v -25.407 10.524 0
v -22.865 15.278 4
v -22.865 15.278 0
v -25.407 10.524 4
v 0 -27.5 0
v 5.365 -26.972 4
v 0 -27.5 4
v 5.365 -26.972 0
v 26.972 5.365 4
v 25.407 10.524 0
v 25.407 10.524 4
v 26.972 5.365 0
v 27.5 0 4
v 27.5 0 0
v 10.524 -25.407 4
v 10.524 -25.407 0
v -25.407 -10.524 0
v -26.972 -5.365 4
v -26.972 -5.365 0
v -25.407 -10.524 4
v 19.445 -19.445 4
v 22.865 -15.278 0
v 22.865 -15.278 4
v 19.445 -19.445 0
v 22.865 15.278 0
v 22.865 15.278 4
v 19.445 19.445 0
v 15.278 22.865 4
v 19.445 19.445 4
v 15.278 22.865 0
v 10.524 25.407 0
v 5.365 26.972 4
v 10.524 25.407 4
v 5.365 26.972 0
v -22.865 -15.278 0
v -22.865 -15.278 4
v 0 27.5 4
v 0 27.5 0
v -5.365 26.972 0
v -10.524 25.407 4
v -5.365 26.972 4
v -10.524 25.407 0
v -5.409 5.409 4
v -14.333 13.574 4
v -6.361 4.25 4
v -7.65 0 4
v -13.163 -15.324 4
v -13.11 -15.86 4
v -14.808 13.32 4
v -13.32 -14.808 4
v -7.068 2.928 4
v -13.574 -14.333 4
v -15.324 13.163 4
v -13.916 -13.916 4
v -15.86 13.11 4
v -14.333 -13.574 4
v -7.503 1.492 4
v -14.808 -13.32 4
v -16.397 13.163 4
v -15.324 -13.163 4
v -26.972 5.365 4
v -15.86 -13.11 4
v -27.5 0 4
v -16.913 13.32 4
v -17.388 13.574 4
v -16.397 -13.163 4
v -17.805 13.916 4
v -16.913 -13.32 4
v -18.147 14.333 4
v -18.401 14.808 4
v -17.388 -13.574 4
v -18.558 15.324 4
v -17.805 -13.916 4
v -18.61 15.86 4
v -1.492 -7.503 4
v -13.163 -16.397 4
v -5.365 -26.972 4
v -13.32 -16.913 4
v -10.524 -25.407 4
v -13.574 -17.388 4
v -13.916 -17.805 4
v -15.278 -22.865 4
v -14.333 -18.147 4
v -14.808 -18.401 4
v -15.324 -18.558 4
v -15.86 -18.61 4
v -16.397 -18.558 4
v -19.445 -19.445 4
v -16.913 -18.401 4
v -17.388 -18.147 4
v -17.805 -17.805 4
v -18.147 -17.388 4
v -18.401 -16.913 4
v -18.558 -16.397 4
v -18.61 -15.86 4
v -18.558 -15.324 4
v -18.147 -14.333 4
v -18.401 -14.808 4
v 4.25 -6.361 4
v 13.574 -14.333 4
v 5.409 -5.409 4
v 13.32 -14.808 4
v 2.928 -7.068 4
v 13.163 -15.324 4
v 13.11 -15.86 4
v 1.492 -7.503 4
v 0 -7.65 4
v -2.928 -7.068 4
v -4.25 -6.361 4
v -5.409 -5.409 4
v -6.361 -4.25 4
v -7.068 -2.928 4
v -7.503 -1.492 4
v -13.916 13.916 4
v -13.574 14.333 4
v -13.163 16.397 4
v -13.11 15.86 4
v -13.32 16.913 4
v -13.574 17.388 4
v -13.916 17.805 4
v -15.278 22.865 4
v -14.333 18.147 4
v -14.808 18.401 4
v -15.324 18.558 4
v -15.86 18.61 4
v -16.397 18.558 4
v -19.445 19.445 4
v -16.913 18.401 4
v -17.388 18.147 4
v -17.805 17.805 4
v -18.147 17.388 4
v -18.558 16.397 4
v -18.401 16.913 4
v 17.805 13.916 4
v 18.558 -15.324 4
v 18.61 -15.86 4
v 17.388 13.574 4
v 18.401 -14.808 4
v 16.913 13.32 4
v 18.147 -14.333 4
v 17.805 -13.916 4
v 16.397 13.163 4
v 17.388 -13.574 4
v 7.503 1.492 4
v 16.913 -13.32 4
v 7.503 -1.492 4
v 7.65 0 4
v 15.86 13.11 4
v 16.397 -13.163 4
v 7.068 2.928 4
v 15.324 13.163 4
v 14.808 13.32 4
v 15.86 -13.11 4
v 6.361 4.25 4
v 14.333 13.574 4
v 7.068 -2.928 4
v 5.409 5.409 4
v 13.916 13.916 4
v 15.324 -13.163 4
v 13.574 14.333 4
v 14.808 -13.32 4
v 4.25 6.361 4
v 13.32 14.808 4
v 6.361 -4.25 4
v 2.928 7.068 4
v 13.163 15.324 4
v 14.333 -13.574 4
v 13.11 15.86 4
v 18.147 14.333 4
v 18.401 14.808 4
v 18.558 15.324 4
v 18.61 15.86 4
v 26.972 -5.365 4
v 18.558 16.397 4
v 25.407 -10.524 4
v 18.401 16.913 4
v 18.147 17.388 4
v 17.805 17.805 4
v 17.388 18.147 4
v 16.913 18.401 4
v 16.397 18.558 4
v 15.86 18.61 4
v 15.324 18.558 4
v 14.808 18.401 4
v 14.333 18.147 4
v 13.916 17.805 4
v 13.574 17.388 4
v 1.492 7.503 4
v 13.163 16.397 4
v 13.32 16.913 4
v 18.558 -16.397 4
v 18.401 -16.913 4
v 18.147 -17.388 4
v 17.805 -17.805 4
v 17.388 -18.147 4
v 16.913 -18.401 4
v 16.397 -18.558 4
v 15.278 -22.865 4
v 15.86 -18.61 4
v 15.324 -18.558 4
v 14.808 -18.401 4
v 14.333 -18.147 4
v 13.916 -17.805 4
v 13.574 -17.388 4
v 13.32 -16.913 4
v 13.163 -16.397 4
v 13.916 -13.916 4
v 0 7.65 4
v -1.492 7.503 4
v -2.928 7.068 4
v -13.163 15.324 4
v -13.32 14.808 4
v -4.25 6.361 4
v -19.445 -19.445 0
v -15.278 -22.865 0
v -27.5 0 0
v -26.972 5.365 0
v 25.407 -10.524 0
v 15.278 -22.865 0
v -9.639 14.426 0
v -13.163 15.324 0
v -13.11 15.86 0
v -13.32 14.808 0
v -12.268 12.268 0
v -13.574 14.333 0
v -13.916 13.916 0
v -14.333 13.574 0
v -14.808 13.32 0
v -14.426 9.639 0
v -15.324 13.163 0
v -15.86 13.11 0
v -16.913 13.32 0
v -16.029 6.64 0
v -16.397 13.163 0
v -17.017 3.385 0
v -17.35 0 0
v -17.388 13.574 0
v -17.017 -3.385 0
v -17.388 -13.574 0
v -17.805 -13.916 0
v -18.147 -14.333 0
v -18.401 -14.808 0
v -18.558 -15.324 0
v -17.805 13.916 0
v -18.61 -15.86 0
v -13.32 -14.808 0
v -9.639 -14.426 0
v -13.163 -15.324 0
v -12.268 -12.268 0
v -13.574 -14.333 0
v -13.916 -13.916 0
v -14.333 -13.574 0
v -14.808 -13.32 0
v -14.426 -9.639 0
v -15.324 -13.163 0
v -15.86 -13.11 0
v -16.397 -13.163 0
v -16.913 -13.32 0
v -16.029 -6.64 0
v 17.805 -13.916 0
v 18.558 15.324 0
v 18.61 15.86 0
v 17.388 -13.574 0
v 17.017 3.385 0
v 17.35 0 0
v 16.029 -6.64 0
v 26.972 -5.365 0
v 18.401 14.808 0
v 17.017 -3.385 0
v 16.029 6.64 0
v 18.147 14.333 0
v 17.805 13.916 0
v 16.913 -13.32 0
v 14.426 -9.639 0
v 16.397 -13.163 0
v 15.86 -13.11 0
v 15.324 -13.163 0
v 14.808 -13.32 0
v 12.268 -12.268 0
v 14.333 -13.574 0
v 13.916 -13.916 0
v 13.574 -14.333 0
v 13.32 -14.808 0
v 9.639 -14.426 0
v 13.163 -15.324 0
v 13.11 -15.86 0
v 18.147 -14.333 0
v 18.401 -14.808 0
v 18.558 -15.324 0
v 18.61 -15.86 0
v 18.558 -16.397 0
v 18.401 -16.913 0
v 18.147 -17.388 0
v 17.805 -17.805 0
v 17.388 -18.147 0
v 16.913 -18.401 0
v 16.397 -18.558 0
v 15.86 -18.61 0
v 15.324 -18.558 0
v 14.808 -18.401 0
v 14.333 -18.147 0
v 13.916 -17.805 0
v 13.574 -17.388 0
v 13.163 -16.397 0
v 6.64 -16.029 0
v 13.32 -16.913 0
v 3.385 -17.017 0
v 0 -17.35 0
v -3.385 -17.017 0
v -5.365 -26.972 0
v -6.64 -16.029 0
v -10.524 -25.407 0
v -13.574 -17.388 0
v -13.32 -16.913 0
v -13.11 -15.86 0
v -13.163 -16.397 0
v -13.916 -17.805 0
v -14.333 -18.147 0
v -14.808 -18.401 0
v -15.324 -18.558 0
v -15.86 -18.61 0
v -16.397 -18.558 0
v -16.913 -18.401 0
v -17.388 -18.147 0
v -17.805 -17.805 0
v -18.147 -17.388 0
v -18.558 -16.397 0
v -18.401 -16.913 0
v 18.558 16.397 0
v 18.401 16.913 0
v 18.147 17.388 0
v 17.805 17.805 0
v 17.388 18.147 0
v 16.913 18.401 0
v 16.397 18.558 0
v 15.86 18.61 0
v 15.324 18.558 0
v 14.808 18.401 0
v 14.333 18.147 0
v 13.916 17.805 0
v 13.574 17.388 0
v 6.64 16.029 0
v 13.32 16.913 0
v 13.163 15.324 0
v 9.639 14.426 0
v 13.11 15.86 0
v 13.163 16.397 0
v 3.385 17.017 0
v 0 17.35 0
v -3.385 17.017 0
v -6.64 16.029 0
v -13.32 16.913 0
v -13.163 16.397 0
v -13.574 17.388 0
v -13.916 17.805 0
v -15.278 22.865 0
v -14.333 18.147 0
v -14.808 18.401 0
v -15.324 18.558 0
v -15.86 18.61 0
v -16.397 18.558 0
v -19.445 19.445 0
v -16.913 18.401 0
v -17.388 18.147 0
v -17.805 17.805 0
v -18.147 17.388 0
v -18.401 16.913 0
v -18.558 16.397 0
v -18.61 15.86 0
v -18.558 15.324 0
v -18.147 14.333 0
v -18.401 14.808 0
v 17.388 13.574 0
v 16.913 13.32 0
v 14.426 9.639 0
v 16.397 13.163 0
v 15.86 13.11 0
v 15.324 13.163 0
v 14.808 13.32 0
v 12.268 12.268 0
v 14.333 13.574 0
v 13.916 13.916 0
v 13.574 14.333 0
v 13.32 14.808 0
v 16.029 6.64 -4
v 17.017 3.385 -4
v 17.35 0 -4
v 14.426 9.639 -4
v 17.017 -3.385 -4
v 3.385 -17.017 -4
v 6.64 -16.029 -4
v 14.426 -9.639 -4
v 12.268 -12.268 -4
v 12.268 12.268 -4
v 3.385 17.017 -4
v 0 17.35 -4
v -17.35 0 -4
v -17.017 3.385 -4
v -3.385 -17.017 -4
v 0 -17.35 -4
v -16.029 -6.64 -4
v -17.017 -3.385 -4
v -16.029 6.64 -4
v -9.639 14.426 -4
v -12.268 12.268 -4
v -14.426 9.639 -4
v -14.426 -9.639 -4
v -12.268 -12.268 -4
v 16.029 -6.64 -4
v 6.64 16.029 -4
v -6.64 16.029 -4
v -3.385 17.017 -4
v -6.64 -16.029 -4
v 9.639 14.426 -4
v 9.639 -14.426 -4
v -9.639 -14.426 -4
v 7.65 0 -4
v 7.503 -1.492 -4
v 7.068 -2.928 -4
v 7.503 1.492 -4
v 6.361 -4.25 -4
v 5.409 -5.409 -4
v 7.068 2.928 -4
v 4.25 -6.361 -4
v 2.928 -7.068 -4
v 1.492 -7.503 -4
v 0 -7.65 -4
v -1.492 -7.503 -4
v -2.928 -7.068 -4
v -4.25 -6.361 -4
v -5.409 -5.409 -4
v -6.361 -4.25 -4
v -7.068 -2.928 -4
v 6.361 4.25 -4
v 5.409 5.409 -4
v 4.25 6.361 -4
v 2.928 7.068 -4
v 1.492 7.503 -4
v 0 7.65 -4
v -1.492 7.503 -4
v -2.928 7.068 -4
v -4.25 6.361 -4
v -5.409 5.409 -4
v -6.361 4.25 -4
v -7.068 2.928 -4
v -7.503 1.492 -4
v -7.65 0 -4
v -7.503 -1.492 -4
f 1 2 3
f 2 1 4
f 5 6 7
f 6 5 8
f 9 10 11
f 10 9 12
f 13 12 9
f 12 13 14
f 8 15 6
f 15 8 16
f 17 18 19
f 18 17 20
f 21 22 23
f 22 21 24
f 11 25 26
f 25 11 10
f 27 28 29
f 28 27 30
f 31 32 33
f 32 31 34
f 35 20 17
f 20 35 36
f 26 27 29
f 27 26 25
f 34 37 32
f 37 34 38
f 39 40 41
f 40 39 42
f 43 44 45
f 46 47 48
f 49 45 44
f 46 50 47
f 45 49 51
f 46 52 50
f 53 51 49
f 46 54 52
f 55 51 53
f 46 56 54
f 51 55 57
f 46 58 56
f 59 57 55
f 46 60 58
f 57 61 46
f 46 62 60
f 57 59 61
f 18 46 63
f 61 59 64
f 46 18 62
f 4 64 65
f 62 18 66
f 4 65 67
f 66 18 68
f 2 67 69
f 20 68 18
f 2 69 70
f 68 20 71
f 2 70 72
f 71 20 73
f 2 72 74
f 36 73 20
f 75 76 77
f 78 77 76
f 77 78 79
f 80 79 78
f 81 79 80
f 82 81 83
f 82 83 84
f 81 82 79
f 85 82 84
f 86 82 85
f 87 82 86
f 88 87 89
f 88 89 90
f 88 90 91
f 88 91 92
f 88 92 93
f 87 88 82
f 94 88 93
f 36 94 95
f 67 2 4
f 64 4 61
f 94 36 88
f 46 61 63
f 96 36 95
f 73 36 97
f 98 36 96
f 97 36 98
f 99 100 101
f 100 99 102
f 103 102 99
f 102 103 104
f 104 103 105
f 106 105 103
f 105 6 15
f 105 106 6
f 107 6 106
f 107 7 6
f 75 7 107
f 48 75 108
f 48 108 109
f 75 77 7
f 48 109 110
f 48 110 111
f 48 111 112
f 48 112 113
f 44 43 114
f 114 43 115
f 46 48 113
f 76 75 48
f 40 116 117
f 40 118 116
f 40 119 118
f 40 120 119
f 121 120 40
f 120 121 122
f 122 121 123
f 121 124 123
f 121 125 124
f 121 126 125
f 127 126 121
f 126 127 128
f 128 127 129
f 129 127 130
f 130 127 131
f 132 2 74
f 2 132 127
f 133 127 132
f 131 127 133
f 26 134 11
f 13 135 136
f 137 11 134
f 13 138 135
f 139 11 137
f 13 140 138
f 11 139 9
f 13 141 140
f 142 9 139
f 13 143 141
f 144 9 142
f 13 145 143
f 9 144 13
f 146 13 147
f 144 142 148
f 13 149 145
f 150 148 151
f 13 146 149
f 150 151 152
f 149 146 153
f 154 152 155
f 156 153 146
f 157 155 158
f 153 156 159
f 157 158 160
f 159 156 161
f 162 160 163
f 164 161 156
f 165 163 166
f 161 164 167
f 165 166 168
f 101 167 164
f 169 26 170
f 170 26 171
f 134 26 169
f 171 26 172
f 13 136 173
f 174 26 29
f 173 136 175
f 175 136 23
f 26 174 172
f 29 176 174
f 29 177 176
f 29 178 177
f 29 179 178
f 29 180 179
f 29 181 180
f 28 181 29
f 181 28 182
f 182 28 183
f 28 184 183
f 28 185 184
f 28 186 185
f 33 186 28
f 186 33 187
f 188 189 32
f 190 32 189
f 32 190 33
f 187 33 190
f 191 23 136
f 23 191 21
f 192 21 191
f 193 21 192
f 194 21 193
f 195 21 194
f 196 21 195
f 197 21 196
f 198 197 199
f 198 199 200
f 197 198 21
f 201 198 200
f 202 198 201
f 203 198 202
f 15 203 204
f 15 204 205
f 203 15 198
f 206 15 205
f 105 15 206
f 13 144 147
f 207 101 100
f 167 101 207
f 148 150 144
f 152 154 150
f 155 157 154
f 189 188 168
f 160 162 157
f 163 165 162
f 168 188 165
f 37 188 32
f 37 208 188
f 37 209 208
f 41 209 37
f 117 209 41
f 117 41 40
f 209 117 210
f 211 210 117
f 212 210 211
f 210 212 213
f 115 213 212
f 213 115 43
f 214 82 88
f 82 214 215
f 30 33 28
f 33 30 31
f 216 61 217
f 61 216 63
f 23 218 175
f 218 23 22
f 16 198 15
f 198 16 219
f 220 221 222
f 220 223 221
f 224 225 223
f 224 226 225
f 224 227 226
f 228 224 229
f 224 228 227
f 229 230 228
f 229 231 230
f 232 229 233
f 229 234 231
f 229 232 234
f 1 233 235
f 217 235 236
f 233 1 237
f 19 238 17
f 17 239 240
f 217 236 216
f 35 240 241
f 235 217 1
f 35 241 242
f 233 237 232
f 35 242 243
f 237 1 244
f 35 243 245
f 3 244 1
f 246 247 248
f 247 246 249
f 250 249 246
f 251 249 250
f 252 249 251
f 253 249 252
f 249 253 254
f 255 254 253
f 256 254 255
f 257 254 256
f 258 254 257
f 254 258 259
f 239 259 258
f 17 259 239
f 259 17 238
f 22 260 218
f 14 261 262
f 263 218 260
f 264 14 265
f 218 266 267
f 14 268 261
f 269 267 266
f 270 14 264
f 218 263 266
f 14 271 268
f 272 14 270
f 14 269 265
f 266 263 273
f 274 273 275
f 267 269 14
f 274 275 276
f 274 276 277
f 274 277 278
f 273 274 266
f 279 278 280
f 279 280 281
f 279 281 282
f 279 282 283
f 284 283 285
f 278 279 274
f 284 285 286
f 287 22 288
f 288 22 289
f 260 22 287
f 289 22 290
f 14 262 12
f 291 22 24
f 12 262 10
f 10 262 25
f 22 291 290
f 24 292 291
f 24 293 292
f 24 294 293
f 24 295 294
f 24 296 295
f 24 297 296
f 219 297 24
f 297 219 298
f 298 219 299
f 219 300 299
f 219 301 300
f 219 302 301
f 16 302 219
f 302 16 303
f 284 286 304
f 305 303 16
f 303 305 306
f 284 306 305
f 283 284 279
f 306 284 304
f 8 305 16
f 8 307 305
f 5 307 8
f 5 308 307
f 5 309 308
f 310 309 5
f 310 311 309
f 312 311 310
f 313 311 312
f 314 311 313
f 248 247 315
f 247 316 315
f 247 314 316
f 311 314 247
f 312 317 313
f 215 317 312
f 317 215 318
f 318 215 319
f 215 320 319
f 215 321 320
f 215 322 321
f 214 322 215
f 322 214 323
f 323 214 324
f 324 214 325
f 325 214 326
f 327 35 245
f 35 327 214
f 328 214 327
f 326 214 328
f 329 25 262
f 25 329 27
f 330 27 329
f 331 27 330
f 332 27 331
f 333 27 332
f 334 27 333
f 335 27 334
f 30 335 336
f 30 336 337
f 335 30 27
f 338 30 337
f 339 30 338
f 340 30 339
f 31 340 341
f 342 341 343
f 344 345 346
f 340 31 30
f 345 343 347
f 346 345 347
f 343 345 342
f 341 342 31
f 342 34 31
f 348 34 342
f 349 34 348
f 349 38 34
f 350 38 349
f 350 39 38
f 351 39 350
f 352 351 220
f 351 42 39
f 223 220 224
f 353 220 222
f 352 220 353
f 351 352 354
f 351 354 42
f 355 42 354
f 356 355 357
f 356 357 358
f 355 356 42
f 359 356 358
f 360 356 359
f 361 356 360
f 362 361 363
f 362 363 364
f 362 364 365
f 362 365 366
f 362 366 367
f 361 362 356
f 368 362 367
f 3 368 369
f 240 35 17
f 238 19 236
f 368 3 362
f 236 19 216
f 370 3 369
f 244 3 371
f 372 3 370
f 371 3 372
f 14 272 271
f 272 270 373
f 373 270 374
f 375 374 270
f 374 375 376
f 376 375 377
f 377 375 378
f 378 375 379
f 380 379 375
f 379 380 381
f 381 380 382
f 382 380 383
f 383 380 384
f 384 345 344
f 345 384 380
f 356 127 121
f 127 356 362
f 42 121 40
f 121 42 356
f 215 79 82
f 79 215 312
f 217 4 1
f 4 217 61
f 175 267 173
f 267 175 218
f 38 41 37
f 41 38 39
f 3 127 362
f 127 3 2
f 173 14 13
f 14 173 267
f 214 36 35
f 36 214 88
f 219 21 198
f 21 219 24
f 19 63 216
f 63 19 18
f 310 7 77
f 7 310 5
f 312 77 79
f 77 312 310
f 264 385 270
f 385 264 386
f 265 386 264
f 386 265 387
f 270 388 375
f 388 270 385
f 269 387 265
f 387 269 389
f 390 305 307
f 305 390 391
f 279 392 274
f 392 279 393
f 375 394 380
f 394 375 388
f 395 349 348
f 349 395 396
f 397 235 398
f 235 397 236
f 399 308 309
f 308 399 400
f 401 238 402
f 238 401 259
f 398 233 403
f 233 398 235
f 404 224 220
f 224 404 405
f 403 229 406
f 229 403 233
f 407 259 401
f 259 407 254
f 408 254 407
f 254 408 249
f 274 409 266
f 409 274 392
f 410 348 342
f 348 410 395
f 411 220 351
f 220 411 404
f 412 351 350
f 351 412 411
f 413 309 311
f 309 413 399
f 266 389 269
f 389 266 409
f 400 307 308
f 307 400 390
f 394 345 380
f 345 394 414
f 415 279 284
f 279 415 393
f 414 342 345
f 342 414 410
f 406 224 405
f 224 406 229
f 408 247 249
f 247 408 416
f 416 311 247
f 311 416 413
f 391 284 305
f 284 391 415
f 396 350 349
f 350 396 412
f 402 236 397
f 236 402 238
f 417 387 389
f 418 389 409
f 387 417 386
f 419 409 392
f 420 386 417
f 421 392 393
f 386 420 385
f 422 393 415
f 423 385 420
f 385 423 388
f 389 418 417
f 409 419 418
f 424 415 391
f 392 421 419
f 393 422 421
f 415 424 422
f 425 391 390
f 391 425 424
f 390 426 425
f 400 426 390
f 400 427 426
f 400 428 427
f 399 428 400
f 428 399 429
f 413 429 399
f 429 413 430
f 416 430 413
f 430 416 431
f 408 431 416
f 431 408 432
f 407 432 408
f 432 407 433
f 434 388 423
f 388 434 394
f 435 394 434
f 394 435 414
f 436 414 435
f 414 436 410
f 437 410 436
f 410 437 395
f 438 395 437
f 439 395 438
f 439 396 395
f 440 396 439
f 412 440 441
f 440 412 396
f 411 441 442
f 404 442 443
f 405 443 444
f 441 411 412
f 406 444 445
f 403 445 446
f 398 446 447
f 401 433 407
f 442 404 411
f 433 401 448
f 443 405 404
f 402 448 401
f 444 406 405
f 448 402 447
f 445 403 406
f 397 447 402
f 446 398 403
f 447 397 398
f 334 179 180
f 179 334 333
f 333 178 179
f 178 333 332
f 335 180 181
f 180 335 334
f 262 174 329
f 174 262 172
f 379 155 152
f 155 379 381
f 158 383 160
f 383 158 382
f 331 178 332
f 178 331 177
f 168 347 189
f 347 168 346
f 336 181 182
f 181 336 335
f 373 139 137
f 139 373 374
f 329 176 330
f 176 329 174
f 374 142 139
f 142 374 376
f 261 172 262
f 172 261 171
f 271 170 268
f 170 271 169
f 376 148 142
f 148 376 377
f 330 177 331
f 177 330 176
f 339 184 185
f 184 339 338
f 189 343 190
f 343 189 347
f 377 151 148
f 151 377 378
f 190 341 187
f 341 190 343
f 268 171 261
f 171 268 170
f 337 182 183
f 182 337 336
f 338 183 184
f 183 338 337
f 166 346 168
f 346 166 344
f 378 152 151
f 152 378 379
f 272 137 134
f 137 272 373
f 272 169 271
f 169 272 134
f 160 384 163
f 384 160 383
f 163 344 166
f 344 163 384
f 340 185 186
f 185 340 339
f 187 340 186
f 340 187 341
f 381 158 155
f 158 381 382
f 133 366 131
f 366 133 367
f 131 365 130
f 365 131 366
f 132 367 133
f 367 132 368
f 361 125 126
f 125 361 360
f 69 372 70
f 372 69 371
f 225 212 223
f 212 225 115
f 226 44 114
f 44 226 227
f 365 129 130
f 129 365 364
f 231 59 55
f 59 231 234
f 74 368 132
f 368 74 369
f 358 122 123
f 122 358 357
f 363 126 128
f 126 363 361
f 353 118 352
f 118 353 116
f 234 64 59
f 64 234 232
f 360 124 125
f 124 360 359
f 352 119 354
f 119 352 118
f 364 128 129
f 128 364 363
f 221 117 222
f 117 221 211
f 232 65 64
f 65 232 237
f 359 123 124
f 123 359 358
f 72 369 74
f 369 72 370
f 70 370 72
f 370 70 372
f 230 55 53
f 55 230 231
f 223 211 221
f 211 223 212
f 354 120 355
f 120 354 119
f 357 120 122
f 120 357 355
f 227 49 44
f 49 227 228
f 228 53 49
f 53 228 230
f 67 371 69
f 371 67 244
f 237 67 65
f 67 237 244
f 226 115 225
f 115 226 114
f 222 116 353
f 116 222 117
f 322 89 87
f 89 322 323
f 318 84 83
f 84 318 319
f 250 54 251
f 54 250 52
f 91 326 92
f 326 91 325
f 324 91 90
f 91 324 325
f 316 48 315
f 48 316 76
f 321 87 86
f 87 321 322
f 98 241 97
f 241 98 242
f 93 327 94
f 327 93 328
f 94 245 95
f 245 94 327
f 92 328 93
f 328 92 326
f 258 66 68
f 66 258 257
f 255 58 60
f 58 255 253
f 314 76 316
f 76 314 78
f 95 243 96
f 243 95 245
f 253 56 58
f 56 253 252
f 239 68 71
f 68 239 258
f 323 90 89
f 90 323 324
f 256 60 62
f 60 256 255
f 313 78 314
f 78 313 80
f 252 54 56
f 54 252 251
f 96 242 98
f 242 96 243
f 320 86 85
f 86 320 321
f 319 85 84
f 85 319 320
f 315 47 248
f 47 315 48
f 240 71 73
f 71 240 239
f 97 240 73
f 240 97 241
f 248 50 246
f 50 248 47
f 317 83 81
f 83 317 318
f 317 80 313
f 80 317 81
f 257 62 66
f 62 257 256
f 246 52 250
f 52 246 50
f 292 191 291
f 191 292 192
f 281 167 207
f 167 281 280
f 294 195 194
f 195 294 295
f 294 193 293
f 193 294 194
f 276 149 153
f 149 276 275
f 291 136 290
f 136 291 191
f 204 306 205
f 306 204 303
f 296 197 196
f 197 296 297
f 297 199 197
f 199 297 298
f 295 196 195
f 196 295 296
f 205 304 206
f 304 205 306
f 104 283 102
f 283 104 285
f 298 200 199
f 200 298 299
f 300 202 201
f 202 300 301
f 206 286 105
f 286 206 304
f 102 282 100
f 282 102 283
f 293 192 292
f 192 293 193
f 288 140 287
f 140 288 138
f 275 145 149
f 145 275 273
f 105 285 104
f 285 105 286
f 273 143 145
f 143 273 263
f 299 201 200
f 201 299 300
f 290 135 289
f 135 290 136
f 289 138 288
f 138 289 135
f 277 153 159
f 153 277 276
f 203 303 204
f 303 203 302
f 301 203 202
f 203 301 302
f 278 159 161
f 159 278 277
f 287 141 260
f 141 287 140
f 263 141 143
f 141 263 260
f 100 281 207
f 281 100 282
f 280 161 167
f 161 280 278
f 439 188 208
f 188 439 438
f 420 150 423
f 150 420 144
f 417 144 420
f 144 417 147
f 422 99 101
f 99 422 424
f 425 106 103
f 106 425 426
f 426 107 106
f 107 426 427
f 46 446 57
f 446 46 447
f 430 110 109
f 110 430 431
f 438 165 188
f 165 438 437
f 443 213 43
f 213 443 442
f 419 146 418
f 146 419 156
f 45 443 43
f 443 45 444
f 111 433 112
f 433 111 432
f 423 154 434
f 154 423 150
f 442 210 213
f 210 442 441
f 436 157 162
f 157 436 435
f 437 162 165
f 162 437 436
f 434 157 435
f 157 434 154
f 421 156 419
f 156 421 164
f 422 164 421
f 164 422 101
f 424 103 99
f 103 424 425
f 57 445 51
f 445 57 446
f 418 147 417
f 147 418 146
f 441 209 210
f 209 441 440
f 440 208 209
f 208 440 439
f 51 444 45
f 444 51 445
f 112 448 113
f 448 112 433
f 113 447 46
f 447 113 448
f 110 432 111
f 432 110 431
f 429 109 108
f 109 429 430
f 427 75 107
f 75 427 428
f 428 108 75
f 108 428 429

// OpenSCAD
$fn = 32;

// ----------------------------------------------------------------------
// Retaining cap: 6202 cover, 55 mm, spigot 34.7 mm
// ----------------------------------------------------------------------

// --- parameters (mm) ---
cover_d = 55;             // cover diameter
cover_t = 4;              // cover thickness
spigot_d = 34.7;          // spigot that enters the housing
spigot_h = 4;             // spigot height
shaft_d = 15.3;           // shaft opening
bolt_d = 5.5;             // bolt clearance
bolt_r = 22.43;           // bolt circle radius

module cover() {
  cylinder(h = cover_t, d = cover_d);
}

module spigot() {
  /* sunk 1 mm into the cover; the spigot sets the overall height */
  translate([0, 0, -spigot_h]) cylinder(h = spigot_h + 1, d = spigot_d);
}

difference() {
  union() {
    cover();
    spigot();
  }
  for (i = [0 : 3]) rotate([0, 0, 45 + i * 90]) translate([bolt_r, 0, -spigot_h - 1])
    cylinder(h = spigot_h + cover_t + 2, d = bolt_d);
  translate([0, 0, -spigot_h - 1]) cylinder(h = spigot_h + cover_t + 2, d = shaft_d);
}
